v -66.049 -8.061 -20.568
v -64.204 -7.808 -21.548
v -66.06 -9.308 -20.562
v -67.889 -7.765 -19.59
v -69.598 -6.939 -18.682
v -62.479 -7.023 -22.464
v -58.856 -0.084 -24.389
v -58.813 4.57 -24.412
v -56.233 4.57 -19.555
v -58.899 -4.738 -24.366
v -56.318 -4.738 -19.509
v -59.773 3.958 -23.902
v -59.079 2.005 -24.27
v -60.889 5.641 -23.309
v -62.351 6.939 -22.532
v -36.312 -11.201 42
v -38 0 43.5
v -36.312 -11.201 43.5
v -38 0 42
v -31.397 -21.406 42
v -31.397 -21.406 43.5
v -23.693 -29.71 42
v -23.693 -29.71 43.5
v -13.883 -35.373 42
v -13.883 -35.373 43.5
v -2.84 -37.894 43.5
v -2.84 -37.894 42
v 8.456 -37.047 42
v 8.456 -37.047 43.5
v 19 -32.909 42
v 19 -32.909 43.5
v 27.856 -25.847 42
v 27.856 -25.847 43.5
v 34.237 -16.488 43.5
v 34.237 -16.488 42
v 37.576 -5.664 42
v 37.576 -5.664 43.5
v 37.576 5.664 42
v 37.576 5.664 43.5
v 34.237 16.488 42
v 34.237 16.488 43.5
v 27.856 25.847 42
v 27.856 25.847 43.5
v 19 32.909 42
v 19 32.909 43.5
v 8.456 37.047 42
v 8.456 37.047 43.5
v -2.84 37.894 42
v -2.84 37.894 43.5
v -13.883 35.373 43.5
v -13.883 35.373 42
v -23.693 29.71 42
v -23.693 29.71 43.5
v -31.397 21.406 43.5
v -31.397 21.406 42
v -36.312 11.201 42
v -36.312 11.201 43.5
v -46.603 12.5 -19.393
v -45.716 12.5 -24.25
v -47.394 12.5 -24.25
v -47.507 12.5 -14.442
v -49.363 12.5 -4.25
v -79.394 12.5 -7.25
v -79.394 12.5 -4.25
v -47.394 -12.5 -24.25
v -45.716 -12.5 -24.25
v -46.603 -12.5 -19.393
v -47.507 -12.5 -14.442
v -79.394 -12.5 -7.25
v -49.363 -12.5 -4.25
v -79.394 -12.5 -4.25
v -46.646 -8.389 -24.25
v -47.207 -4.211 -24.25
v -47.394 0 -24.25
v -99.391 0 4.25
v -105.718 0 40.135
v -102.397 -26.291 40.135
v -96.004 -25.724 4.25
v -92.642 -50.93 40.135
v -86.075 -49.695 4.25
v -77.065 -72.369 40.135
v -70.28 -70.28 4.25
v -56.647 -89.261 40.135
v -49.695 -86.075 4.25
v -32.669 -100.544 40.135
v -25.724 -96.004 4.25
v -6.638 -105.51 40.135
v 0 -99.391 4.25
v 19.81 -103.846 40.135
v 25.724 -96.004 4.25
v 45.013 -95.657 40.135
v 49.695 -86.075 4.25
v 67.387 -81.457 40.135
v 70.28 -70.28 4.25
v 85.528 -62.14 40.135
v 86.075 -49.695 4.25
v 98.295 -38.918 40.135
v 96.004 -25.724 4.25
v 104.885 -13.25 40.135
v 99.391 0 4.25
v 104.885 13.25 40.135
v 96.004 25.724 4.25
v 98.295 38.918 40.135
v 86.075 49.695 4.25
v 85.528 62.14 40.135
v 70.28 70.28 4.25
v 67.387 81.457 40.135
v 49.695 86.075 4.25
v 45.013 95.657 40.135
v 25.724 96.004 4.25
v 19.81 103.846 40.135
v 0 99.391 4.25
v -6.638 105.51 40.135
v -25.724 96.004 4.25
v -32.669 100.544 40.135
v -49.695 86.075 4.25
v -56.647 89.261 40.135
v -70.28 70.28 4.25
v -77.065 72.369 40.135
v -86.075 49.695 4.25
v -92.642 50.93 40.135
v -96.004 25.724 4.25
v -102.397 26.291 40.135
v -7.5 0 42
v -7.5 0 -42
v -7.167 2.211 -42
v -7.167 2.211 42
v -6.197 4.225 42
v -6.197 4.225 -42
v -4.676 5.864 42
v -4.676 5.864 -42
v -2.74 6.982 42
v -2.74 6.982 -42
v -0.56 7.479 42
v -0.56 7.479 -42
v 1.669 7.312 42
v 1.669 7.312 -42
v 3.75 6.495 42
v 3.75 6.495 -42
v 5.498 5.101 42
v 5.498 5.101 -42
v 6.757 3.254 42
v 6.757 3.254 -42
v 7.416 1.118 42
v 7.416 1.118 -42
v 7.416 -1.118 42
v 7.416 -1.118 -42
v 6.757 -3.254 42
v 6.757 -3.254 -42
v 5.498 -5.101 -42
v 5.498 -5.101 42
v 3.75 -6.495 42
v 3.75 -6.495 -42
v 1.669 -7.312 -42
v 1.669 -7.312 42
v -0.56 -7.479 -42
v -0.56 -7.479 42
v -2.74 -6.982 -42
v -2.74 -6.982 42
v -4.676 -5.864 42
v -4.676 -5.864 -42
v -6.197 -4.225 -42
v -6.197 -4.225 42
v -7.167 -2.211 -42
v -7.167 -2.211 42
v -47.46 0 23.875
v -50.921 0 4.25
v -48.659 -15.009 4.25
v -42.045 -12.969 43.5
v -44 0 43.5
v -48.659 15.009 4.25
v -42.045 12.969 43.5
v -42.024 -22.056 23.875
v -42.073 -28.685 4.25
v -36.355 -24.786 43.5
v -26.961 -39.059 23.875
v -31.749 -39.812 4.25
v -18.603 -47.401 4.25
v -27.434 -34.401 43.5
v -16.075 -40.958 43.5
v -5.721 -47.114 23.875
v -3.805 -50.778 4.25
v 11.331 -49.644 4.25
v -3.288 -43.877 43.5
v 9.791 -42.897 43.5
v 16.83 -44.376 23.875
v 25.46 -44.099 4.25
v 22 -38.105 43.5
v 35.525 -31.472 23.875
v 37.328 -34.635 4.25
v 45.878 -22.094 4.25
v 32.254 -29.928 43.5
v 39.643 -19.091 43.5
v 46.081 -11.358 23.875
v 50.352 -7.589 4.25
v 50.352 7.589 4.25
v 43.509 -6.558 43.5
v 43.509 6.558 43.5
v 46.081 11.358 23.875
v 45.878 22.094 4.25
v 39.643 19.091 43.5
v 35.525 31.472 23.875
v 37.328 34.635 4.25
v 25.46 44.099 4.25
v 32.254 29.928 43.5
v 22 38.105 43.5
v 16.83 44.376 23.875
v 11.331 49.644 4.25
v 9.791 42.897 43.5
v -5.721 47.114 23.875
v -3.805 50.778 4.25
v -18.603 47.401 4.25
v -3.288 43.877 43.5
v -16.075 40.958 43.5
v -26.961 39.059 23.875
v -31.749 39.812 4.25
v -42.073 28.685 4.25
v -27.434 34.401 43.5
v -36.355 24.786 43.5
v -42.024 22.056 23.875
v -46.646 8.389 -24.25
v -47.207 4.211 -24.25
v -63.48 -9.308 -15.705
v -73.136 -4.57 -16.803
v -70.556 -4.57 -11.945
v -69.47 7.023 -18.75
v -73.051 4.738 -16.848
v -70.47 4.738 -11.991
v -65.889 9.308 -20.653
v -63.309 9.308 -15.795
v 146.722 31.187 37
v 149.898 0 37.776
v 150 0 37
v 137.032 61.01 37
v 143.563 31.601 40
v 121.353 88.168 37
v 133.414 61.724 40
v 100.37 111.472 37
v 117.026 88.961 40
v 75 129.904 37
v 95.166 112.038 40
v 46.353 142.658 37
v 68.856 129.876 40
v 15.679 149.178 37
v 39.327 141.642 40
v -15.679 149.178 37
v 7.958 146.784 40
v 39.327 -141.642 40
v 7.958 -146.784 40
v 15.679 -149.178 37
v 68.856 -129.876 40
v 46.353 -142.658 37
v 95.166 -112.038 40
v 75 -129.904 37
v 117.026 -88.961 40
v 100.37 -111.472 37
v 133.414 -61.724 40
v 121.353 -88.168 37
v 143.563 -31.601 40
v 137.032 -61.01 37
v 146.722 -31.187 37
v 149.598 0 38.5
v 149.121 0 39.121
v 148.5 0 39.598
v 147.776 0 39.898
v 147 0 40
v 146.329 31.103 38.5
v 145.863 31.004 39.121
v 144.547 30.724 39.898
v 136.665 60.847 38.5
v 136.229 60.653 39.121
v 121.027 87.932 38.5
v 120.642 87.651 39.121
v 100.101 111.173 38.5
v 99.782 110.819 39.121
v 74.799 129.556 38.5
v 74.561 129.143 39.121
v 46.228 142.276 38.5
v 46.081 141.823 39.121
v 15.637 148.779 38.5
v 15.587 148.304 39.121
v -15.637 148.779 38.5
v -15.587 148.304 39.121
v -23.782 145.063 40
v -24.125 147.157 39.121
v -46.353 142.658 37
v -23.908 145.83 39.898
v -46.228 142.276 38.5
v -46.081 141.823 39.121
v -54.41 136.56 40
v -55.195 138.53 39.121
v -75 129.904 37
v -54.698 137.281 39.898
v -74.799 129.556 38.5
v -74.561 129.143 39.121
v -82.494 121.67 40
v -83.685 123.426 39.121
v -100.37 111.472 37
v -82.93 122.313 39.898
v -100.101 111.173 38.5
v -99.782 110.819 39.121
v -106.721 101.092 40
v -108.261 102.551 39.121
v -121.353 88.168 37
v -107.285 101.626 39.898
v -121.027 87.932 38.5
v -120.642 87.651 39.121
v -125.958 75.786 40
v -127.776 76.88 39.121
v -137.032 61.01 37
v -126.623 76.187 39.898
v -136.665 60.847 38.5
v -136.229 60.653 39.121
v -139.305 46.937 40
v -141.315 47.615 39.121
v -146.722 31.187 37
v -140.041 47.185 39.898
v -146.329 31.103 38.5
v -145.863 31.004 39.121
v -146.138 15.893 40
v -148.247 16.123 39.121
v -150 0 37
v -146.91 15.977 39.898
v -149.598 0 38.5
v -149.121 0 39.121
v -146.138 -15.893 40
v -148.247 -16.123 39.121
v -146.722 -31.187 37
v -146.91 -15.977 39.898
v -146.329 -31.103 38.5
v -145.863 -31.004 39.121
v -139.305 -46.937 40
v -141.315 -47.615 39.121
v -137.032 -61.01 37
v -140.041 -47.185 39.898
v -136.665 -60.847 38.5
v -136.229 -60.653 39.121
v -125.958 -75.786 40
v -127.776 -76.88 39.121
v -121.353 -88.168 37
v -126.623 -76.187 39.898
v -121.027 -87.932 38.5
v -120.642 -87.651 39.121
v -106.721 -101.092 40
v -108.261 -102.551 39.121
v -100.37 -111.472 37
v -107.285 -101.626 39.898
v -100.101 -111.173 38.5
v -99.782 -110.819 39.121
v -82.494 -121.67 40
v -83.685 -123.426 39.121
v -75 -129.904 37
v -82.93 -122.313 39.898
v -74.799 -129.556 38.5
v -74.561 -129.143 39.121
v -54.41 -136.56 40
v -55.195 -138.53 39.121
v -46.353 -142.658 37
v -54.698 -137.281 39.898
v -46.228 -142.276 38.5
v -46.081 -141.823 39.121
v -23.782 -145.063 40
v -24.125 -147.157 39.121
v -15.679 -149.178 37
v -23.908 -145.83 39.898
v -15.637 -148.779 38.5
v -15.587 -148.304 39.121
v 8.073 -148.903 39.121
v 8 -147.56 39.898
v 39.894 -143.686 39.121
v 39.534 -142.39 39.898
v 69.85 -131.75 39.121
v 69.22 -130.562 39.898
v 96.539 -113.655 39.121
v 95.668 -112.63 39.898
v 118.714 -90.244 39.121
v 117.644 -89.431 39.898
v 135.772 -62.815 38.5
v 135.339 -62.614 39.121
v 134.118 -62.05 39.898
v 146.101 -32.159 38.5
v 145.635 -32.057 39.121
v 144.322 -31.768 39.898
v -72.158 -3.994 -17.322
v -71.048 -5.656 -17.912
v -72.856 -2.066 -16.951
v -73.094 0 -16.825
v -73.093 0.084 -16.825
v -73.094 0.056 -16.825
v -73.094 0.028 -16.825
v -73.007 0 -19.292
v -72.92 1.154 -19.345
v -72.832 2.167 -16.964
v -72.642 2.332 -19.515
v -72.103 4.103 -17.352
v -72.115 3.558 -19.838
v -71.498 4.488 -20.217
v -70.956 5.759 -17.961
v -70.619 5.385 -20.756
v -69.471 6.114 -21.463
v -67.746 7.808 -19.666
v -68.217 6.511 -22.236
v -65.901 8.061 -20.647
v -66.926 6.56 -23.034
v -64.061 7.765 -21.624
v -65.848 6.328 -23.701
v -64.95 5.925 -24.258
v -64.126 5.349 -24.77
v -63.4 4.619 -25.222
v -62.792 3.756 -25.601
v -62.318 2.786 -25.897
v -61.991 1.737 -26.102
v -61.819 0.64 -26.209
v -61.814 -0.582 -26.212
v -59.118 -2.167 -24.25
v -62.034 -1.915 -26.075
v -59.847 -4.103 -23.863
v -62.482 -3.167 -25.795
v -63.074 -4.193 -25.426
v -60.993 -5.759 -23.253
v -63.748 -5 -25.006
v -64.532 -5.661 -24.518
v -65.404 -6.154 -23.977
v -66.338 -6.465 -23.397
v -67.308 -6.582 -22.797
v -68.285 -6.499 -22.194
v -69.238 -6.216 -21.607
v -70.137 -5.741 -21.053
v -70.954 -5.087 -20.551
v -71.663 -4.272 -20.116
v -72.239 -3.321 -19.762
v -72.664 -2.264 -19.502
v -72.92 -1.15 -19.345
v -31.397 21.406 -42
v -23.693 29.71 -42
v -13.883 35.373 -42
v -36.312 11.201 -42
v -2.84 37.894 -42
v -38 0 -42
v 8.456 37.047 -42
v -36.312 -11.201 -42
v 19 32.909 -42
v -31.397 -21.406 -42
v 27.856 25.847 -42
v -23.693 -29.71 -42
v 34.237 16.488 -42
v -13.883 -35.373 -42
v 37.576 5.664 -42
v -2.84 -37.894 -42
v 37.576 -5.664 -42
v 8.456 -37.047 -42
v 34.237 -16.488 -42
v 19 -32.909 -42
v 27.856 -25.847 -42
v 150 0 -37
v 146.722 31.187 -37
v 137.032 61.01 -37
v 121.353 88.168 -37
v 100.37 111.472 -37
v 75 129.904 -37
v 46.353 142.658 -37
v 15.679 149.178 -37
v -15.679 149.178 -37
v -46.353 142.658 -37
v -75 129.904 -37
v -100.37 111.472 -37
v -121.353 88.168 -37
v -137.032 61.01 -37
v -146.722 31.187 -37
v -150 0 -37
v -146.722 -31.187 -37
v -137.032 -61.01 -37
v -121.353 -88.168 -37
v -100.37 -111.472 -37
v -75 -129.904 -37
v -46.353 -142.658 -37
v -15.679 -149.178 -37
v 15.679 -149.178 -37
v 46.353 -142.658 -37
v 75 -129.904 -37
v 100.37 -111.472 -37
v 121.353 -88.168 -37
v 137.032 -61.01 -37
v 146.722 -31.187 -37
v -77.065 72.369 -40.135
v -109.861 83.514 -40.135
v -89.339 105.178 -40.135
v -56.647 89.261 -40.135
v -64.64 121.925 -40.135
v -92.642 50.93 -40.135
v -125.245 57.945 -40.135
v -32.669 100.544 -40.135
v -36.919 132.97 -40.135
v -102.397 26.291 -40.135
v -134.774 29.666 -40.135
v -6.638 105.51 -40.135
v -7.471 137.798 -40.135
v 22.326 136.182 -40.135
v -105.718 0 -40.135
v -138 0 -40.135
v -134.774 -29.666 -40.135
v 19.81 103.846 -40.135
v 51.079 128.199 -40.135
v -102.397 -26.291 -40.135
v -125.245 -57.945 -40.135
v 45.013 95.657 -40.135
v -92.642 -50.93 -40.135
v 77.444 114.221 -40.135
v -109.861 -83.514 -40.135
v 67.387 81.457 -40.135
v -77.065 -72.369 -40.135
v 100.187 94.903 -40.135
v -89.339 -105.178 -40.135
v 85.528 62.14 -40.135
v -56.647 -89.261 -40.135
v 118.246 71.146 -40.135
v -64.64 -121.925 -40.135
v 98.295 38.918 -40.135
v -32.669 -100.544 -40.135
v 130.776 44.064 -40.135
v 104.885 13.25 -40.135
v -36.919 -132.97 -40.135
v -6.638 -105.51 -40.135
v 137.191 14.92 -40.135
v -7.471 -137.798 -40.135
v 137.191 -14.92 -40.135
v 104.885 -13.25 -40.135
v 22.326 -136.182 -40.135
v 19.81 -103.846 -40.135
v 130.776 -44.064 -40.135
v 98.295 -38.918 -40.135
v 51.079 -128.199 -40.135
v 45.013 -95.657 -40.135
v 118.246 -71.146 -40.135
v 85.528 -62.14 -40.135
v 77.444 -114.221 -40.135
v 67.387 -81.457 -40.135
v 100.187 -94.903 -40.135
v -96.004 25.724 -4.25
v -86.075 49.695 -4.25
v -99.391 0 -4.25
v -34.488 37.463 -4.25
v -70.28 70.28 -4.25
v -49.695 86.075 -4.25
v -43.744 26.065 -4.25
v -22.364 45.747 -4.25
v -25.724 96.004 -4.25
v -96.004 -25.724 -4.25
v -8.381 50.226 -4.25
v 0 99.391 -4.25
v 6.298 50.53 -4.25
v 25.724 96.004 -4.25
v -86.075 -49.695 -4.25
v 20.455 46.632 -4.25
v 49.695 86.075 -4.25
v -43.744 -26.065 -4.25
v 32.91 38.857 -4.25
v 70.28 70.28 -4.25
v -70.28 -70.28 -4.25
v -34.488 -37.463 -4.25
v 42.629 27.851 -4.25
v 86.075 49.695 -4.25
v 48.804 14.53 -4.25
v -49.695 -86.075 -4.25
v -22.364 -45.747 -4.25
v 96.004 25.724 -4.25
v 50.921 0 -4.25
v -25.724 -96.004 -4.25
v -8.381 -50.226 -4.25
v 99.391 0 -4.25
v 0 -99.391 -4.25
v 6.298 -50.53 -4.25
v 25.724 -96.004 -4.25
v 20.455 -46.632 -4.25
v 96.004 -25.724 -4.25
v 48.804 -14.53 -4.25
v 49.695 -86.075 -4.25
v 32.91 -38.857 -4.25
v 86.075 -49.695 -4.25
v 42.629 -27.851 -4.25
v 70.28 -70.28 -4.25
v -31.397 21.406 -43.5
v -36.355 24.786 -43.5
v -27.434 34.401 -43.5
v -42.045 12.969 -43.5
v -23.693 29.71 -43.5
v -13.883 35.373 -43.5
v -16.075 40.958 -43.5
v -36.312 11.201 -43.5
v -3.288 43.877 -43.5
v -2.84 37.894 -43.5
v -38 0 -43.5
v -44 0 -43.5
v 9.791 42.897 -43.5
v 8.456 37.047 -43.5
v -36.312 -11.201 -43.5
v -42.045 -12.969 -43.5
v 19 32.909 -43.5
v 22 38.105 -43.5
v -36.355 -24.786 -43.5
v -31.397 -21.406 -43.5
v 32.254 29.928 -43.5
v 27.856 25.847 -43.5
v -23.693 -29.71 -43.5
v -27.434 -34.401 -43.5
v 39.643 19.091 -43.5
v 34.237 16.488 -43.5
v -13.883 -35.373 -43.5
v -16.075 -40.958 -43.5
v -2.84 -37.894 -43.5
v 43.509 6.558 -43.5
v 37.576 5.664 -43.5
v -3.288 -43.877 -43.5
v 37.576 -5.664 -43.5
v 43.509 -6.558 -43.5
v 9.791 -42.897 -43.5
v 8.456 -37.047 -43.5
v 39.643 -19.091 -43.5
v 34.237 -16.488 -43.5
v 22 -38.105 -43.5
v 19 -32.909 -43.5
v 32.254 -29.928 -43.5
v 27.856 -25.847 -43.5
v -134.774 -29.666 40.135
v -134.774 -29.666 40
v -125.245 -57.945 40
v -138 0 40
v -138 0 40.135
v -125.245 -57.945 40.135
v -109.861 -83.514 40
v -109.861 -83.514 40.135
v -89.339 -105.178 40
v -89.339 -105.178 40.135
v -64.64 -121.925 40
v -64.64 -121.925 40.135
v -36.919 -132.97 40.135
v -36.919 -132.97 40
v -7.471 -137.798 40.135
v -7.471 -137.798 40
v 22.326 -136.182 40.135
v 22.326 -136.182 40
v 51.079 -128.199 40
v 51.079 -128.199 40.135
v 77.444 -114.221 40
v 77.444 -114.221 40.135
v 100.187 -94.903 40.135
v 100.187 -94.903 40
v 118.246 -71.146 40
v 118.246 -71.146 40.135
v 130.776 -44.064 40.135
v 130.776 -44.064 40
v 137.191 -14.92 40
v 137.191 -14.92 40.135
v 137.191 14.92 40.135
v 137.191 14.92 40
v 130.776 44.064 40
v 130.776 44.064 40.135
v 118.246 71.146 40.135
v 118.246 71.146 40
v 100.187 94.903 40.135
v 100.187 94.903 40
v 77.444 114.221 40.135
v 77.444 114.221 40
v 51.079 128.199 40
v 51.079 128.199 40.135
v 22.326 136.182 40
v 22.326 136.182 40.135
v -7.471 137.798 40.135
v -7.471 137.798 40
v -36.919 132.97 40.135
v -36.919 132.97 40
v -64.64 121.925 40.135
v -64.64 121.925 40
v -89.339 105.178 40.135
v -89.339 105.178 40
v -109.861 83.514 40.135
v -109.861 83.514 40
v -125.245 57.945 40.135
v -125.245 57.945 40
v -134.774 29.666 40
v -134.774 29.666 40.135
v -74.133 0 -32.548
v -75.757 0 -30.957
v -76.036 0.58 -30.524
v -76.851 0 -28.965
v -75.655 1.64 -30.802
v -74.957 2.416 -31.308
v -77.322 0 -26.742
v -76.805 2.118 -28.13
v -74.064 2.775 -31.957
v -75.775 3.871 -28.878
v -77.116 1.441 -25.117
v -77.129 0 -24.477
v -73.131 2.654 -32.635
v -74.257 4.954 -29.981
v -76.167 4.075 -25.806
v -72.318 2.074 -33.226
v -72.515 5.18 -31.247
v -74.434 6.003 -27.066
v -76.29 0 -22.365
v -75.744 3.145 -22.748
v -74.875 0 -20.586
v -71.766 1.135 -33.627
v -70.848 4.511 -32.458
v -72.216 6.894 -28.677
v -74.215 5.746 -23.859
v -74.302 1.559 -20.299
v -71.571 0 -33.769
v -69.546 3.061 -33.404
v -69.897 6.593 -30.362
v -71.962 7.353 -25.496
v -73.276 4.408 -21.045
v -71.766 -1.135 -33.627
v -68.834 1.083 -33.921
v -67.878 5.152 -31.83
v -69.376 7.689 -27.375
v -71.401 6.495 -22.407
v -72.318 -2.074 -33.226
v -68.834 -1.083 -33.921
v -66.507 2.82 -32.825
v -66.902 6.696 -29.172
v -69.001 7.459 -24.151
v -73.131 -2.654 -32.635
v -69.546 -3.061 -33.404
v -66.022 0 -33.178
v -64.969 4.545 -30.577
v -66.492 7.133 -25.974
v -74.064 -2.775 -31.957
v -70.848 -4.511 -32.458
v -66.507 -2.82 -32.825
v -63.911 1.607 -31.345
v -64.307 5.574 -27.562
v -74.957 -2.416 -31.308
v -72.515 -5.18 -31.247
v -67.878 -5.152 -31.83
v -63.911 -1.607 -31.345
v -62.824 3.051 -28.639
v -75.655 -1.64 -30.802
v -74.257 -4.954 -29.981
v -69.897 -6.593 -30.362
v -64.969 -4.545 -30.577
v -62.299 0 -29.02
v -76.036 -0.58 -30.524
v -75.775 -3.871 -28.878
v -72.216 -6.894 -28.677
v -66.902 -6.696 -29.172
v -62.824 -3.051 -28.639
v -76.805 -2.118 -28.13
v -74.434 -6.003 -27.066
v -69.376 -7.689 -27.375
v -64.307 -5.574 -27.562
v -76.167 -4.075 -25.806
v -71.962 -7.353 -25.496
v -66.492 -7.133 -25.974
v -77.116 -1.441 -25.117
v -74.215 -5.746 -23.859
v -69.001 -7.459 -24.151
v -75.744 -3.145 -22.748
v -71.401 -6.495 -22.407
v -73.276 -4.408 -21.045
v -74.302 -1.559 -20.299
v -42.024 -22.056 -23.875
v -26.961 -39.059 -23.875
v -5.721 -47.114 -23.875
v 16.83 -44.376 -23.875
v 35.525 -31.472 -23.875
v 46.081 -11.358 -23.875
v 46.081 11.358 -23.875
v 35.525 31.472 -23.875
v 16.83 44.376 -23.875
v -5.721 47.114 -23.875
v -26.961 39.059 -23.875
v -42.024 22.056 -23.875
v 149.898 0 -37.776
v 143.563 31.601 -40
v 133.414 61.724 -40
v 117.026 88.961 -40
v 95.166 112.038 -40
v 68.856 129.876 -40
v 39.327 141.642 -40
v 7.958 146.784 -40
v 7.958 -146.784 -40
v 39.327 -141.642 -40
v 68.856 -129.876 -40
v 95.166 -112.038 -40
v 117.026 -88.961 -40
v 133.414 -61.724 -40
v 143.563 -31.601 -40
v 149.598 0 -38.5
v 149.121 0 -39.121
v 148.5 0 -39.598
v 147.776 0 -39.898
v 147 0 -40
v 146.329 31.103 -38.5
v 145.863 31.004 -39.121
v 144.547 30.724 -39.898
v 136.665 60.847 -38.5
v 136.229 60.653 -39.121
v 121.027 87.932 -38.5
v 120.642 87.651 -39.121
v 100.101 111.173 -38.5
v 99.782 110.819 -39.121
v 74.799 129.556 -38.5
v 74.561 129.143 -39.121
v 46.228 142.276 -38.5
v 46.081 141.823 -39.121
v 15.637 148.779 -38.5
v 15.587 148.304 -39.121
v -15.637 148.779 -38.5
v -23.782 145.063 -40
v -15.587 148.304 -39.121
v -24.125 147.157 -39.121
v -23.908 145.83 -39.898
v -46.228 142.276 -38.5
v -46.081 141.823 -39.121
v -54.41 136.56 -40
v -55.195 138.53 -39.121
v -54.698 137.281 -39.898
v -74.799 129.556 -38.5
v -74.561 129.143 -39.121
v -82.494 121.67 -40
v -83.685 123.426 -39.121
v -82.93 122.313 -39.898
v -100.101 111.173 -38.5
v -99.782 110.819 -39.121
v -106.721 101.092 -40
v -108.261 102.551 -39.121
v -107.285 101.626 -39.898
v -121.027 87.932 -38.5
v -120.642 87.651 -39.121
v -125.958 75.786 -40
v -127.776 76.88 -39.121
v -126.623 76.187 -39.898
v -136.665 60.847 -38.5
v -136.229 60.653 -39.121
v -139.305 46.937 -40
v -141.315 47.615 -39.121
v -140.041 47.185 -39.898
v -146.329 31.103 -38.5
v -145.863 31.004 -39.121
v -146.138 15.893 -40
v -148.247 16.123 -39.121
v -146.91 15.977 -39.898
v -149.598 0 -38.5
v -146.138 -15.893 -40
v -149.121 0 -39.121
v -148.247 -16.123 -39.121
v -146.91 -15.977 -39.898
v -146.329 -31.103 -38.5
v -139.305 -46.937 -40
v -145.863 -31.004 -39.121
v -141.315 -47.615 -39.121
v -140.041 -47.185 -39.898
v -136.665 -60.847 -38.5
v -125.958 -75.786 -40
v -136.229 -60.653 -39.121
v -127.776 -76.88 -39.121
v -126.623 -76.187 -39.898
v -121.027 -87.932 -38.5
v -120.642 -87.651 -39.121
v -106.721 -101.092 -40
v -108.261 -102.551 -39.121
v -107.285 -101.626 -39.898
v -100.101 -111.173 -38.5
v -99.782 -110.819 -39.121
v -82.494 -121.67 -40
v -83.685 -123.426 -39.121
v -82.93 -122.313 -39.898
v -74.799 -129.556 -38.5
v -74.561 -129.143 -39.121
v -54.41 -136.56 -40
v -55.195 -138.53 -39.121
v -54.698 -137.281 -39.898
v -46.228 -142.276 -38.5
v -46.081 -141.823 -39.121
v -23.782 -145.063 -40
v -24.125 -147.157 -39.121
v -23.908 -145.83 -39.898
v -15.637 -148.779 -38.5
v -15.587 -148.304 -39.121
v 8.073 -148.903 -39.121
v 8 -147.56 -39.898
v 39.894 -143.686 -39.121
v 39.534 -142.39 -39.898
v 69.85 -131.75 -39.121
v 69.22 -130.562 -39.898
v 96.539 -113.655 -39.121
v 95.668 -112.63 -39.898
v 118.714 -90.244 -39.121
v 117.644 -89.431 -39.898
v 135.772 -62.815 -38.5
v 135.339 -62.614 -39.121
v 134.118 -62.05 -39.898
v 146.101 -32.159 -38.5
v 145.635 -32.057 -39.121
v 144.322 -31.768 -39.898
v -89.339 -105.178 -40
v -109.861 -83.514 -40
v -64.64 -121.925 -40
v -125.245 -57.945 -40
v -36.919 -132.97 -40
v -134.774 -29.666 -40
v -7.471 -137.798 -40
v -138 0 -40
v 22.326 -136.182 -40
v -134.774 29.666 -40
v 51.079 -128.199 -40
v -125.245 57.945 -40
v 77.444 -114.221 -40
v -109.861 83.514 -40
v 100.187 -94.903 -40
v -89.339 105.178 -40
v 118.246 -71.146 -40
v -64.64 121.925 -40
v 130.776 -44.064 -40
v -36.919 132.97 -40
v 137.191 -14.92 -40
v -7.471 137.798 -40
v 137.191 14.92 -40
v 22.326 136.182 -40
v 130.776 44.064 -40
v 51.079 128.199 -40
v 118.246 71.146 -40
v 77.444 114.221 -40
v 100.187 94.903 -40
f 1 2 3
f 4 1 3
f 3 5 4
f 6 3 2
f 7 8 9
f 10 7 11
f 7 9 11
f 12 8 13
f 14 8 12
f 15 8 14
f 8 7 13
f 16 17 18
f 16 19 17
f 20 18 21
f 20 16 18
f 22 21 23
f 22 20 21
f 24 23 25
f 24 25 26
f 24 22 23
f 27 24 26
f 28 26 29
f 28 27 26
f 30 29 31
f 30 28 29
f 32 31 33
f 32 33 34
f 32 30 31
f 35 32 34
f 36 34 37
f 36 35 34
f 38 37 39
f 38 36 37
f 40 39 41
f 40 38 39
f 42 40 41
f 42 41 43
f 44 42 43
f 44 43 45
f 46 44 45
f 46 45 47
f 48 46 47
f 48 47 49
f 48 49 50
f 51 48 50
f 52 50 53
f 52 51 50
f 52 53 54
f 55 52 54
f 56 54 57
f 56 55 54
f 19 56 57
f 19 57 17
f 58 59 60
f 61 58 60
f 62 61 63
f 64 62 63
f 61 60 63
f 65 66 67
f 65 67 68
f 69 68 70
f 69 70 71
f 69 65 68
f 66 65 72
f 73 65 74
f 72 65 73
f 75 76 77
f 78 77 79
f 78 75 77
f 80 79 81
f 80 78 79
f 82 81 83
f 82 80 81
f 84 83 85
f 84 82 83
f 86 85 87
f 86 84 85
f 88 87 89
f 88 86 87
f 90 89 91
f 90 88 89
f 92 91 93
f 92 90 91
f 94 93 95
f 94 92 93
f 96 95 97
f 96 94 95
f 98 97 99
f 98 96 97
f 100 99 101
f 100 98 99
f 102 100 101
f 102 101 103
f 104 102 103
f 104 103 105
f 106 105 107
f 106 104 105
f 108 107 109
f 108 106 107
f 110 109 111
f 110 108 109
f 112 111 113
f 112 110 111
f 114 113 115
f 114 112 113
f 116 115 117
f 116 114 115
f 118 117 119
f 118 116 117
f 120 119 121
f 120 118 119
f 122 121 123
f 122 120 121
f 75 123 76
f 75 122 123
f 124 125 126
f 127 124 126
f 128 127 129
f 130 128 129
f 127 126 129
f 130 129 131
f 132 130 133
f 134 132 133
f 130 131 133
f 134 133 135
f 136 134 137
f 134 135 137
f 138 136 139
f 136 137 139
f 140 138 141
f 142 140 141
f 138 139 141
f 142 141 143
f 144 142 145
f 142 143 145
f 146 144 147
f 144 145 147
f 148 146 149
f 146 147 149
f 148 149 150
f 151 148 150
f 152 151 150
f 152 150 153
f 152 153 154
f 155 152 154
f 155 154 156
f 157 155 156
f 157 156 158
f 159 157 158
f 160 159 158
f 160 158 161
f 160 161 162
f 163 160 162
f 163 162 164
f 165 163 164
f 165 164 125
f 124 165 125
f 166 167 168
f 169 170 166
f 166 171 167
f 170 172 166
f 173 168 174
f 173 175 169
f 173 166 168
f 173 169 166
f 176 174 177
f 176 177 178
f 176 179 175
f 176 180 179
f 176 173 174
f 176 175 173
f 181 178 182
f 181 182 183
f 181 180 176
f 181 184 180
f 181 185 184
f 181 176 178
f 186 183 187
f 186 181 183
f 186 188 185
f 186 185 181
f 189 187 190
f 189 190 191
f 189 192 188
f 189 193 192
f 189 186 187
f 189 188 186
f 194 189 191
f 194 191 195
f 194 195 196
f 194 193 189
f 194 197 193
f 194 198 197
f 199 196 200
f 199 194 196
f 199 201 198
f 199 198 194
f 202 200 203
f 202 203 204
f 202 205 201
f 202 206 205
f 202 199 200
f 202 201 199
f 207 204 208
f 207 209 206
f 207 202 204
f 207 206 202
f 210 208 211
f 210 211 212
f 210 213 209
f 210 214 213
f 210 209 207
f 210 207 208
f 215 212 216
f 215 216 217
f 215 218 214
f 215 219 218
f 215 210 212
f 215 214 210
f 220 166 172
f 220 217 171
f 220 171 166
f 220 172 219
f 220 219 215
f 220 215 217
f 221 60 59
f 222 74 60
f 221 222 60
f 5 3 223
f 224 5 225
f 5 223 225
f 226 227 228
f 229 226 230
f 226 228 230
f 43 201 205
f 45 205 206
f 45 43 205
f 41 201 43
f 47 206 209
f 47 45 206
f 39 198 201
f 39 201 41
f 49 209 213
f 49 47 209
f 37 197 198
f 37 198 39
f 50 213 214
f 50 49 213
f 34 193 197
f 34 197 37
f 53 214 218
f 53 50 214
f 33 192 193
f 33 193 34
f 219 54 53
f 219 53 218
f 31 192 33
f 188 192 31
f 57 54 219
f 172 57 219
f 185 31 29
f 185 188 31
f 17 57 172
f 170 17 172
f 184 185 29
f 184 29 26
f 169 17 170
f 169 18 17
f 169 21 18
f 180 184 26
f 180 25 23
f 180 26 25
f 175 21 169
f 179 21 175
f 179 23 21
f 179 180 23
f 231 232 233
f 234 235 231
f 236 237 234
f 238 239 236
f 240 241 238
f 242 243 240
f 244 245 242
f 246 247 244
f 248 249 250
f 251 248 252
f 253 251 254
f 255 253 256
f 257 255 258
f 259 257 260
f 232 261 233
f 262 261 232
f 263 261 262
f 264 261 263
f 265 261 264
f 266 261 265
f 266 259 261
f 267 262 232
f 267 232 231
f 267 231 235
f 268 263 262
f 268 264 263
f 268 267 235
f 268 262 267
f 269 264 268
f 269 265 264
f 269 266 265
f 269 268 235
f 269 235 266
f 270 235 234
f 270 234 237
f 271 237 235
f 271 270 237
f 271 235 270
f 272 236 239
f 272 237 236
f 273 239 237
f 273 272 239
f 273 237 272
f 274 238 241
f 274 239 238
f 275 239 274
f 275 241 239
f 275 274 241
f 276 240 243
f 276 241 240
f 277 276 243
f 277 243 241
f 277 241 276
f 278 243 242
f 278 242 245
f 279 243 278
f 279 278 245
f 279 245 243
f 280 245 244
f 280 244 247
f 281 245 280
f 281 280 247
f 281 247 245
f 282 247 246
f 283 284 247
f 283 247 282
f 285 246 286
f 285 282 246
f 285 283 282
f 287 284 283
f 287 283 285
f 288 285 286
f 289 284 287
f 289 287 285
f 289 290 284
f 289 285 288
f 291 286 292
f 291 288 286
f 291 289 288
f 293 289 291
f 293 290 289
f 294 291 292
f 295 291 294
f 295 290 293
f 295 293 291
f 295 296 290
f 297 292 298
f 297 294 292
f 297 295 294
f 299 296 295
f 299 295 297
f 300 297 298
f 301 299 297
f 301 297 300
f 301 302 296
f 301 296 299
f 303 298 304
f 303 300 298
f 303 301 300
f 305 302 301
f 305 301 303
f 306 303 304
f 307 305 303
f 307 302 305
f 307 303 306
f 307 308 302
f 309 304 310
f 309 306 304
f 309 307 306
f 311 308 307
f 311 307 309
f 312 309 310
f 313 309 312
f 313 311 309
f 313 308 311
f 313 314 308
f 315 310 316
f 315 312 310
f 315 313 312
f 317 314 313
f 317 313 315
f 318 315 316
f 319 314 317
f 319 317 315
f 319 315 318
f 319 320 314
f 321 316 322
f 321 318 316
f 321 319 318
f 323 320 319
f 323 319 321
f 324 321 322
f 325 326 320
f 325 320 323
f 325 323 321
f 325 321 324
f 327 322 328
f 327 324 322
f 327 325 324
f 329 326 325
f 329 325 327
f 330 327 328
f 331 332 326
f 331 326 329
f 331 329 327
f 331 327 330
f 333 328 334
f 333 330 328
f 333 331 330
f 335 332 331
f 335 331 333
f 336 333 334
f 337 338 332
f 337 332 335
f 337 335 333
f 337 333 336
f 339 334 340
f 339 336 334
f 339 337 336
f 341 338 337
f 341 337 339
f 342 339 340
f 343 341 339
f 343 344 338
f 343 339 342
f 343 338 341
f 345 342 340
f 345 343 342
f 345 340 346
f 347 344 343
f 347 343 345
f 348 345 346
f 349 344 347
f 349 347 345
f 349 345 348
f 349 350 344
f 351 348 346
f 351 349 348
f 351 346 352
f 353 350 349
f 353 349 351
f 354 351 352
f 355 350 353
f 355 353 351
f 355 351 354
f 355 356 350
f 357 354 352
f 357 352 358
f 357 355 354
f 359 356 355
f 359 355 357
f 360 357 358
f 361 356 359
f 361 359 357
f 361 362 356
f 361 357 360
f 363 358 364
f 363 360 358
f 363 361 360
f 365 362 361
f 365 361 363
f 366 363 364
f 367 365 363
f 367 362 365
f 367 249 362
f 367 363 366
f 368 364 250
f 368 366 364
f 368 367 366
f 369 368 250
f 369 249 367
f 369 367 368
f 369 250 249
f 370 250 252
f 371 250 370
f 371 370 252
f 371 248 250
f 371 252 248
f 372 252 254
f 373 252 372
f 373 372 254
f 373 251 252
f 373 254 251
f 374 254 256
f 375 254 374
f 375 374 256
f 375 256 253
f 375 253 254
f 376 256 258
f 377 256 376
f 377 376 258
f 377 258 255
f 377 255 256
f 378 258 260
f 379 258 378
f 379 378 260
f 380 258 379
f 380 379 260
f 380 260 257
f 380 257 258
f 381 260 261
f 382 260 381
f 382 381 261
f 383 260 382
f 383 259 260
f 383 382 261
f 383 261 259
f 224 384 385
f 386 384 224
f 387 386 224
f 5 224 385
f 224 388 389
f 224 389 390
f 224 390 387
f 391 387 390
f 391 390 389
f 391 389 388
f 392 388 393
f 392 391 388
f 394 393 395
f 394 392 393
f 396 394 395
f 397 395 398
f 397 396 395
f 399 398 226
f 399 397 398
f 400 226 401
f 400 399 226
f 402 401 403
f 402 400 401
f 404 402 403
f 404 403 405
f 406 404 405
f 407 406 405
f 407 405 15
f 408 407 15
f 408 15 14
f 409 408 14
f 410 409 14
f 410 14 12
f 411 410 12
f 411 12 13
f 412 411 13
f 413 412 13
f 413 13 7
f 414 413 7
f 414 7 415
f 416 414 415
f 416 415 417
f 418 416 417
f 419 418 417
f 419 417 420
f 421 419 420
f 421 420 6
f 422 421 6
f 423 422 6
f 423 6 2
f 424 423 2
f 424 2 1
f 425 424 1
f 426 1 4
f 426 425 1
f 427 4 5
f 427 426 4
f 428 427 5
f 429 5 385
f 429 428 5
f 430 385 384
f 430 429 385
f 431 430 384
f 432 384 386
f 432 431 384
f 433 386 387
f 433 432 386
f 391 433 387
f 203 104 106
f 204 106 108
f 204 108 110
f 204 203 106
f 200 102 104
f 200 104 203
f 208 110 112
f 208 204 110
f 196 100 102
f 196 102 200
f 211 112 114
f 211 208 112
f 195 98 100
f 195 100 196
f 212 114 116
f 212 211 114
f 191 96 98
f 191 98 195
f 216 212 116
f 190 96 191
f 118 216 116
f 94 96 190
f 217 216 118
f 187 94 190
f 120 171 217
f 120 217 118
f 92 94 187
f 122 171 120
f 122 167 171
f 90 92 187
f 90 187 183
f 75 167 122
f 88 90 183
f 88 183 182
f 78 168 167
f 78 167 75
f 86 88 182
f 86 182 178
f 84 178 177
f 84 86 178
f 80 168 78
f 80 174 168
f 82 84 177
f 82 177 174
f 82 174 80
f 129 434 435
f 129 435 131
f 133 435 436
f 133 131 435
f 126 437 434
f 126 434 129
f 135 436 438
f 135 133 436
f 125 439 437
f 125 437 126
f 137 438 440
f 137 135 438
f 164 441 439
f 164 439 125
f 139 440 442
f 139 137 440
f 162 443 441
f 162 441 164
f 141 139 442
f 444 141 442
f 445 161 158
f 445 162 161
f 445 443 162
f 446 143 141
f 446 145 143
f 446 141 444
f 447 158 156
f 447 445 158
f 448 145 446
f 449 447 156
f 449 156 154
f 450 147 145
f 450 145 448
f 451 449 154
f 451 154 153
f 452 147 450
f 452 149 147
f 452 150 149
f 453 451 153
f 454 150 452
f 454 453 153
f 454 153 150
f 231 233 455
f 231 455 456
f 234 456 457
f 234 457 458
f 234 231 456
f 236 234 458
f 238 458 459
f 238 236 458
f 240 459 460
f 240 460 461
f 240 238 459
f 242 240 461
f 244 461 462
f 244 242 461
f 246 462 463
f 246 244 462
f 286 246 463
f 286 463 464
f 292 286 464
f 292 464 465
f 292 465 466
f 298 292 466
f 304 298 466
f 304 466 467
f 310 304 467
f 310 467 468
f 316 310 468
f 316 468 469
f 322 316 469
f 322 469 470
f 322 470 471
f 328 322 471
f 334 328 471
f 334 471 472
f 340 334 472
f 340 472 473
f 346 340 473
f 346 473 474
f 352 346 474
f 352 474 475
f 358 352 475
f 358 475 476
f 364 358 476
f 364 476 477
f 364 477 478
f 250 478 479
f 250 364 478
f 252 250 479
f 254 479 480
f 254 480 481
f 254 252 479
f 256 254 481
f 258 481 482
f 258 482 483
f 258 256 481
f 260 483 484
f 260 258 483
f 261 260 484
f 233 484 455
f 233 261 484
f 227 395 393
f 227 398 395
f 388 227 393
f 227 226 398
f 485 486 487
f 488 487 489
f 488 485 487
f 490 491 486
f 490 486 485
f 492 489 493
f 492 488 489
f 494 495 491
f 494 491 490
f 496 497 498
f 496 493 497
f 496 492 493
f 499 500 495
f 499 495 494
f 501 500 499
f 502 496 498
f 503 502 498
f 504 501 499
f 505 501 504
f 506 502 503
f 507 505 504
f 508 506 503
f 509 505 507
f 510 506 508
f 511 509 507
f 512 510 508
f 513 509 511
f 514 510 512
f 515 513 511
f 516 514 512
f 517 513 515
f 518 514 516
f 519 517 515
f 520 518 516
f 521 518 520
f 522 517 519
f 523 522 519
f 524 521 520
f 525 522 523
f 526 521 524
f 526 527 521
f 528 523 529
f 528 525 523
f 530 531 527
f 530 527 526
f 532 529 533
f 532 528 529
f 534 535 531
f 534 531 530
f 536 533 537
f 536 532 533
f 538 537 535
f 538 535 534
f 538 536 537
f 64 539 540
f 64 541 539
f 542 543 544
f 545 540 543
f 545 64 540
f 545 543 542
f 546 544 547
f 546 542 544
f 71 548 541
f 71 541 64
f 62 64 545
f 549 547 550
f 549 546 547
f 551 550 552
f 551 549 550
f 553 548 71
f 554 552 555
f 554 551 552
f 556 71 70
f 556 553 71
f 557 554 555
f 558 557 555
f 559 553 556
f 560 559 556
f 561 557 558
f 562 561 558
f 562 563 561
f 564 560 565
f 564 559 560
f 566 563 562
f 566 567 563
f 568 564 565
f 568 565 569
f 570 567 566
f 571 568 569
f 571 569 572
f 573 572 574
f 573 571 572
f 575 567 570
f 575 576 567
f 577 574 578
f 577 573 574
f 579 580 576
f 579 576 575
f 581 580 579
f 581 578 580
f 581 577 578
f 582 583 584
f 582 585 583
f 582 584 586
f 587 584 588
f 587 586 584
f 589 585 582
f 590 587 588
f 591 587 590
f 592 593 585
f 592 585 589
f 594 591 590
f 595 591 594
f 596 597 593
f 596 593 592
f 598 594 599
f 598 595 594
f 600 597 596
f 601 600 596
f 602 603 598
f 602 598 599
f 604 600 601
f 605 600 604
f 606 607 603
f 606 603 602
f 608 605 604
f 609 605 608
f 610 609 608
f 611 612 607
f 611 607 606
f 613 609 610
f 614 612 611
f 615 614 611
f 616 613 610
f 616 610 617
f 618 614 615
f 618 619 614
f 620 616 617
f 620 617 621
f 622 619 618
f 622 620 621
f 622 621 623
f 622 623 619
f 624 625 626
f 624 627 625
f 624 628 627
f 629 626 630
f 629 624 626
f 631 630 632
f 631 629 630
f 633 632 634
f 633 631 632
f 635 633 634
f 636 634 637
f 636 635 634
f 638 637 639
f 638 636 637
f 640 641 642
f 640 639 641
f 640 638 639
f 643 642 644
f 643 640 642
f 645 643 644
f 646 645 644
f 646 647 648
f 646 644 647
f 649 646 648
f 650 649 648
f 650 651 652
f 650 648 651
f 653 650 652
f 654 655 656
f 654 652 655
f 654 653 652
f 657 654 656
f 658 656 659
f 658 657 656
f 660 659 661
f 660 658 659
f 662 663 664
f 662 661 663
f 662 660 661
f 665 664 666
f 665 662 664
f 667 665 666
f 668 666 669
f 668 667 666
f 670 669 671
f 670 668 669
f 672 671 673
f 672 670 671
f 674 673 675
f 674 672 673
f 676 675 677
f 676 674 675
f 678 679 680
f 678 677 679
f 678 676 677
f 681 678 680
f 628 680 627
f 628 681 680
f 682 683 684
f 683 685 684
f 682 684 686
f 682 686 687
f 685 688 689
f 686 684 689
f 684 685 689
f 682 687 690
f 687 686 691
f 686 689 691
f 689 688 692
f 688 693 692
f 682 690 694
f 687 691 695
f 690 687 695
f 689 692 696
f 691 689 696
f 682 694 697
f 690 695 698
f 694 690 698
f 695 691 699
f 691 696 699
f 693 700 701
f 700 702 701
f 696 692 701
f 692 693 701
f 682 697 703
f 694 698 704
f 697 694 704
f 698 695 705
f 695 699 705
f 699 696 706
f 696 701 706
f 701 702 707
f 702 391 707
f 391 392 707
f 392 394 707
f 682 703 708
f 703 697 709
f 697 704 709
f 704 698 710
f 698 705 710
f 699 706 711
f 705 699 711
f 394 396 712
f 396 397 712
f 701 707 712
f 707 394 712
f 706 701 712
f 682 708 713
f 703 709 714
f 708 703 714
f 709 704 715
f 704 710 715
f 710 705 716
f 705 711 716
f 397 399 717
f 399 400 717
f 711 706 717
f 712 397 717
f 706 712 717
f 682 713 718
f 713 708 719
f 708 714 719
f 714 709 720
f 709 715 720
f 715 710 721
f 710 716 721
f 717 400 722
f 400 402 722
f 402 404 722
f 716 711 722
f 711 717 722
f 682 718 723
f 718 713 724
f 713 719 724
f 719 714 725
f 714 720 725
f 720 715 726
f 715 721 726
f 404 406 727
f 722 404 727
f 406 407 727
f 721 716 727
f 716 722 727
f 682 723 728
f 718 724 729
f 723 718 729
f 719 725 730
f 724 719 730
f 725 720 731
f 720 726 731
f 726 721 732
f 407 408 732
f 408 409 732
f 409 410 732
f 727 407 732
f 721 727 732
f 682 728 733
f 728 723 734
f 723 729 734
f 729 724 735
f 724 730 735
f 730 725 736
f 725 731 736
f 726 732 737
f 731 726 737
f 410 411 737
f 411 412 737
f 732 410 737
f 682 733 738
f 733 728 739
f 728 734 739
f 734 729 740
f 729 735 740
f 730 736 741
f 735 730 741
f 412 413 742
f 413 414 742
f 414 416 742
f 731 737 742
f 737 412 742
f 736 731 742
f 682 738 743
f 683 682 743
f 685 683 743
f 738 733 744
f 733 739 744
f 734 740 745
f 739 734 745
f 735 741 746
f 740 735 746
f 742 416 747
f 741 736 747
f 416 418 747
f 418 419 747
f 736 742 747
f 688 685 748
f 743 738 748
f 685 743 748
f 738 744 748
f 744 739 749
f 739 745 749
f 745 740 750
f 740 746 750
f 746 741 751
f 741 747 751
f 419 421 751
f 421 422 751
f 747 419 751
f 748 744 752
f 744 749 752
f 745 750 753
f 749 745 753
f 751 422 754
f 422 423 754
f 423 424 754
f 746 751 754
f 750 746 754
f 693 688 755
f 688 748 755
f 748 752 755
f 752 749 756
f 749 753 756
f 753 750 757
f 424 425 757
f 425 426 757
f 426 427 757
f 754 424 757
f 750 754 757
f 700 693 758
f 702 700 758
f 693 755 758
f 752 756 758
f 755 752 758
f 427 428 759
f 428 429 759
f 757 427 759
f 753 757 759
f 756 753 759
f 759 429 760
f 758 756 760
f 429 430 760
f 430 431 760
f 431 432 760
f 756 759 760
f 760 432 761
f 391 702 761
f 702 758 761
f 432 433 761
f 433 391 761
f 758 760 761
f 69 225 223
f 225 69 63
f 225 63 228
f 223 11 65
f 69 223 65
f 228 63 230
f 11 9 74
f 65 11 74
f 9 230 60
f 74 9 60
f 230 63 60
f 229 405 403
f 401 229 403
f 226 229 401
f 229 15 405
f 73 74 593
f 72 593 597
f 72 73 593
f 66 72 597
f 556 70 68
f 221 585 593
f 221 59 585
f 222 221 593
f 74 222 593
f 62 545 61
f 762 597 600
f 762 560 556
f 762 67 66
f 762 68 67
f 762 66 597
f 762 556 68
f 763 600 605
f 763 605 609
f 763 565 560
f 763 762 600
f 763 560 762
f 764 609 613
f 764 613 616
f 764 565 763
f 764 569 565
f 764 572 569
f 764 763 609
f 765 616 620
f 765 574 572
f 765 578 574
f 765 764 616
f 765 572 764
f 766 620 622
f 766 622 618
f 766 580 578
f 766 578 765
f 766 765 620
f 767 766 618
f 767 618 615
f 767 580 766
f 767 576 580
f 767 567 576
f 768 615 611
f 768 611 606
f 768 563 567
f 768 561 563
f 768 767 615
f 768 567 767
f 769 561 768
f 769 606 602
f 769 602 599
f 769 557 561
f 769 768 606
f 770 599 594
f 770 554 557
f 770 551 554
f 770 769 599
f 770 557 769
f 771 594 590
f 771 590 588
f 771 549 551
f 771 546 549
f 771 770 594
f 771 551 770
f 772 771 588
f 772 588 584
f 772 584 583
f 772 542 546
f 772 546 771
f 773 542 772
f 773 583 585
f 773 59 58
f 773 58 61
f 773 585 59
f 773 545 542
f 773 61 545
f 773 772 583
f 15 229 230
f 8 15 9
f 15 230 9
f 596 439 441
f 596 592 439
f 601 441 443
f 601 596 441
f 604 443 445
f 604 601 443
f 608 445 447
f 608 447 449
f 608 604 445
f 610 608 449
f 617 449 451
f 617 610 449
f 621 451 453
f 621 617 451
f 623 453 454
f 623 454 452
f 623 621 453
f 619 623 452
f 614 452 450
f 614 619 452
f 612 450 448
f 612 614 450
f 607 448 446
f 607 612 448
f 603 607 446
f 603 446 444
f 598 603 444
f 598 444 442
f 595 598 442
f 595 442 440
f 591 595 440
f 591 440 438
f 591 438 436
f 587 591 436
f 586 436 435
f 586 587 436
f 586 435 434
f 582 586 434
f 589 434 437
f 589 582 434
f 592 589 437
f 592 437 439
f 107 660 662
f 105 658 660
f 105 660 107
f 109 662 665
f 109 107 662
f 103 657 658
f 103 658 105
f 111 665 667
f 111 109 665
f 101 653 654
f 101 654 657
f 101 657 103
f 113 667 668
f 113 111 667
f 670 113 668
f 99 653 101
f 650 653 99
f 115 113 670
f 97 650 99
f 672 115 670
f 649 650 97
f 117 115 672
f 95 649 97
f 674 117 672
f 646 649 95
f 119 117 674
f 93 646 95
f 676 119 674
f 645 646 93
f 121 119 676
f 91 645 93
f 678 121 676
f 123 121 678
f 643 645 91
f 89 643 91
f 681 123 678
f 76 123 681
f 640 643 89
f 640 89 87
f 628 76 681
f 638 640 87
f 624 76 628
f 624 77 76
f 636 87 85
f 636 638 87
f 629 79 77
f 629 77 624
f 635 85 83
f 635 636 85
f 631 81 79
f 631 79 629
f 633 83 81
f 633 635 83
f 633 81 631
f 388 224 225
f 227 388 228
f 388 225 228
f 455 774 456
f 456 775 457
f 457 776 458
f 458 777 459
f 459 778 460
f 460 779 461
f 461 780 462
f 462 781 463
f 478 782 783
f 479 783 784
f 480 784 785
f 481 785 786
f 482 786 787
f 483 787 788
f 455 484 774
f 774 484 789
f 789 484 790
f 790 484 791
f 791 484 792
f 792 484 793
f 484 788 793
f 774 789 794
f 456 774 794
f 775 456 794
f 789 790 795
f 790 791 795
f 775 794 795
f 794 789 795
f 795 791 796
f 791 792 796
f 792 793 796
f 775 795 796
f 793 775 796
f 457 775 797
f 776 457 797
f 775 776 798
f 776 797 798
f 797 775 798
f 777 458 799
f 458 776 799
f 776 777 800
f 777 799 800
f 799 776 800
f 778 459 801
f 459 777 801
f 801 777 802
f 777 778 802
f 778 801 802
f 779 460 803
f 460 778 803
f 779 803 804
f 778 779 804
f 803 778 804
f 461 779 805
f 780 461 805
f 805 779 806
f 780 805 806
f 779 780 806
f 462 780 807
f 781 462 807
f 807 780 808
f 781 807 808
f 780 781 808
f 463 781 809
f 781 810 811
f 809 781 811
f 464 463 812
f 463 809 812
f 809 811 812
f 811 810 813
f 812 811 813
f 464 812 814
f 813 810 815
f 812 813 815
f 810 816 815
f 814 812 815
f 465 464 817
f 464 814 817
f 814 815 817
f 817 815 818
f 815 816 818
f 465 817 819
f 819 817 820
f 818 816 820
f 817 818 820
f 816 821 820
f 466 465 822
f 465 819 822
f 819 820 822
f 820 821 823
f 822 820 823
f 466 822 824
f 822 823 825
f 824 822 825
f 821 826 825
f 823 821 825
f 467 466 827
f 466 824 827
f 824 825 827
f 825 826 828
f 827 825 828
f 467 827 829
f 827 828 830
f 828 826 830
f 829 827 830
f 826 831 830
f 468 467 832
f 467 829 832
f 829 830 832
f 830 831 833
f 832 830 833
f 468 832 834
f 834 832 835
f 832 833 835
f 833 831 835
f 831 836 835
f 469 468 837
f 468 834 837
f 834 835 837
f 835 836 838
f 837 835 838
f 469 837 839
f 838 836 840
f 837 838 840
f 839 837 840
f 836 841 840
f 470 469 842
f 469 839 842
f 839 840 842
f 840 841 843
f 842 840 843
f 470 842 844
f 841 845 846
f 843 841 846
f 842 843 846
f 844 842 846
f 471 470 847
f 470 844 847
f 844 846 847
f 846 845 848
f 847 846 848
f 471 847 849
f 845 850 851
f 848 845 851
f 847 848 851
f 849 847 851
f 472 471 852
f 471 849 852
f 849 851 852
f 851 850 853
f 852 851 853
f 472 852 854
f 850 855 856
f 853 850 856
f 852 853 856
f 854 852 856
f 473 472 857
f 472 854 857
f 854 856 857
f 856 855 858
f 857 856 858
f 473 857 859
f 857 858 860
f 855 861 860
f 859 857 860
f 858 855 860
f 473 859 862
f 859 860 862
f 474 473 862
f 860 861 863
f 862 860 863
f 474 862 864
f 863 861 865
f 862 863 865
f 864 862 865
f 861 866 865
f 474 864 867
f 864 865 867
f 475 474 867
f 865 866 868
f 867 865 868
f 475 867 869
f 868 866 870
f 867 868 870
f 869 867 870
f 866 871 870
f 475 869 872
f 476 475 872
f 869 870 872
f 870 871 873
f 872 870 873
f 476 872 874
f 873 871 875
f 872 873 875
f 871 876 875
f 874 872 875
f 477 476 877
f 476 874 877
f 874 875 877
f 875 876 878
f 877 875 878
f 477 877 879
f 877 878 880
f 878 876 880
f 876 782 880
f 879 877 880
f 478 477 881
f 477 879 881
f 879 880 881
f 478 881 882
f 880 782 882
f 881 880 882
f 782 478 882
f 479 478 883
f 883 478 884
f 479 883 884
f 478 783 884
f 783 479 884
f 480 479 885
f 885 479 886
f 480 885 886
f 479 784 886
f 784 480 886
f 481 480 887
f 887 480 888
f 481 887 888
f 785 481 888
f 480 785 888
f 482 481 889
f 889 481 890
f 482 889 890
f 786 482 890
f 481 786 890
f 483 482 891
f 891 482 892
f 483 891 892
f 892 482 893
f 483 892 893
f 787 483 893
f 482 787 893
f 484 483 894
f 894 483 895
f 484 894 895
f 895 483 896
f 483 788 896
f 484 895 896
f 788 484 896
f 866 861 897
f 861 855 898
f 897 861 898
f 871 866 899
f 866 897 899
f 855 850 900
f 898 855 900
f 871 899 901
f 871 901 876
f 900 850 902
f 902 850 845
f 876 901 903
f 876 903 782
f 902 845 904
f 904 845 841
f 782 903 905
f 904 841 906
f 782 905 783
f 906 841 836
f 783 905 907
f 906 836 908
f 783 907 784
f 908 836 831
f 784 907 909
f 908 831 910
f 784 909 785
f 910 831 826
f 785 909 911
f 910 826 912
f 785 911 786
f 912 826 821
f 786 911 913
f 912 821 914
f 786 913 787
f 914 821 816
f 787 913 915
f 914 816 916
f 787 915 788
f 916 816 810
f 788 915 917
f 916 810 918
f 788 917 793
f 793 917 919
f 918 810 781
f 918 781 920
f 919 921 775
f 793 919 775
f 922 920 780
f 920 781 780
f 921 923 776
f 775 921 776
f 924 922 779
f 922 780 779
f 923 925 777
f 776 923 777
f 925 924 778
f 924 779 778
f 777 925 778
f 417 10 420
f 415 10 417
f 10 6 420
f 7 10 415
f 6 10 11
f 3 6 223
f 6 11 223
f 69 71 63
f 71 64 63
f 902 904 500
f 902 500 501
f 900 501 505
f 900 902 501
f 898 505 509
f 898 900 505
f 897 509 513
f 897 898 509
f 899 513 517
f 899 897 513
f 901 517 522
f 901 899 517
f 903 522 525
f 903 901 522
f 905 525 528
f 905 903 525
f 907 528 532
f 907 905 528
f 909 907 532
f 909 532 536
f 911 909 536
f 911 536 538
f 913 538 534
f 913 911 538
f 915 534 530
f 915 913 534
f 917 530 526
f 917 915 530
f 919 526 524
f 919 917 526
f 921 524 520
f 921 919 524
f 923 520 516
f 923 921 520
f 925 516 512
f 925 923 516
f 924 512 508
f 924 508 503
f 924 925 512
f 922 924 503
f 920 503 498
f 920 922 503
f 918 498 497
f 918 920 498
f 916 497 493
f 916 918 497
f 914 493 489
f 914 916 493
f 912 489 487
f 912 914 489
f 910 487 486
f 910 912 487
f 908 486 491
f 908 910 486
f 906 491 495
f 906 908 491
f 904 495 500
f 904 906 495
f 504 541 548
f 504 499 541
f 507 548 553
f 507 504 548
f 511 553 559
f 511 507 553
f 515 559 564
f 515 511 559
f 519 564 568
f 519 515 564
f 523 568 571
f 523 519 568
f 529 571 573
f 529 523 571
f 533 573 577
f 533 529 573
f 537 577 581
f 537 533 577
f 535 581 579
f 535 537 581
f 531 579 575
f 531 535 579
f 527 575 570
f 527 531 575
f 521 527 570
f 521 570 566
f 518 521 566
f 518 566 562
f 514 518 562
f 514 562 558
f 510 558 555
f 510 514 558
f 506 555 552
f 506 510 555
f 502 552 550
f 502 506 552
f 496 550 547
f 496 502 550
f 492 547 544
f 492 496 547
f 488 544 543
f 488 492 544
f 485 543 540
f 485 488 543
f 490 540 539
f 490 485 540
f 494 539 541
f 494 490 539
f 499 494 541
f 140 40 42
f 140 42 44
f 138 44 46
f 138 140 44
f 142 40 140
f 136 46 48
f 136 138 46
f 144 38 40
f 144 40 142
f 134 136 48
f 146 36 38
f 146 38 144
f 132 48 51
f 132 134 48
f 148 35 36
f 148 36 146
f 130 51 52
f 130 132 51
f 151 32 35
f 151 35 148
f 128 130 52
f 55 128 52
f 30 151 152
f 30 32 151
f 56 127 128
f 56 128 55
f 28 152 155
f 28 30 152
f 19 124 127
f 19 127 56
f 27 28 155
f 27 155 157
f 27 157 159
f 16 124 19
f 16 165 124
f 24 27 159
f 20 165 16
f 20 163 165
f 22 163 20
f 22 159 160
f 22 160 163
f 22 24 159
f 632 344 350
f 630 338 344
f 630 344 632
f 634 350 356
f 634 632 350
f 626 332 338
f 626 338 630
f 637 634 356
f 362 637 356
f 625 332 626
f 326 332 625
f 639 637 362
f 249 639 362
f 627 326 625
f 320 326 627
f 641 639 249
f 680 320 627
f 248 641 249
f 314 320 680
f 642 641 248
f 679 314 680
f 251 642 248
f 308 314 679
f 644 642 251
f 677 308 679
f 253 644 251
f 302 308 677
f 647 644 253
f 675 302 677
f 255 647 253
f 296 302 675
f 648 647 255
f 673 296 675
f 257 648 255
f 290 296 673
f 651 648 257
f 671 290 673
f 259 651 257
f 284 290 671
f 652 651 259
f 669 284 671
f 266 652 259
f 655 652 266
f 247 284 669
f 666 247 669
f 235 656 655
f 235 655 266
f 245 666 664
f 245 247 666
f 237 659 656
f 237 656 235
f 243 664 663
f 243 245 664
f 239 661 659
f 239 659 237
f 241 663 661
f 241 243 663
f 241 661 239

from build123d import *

# Parameters (mm, degrees)
SKETCH1_R           = 150
SKETCH1_R_2         = 138
BOSS_EXTRUDE1_DEPTH = 40
FILLET4_R           = 3
BOSS_EXTRUDE2_DEPTH = 12.5
BOSS_EXTRUDE3_DEPTH = 5.5
SKETCH6_R           = 8.061337792
BOSS_EXTRUDE4_DEPTH = 3
BOSS_EXTRUDE4_TAPER = 30
SKETCH8_R           = 7.5
CUT_EXTRUDE1_DEPTH  = 229.714341483


with BuildPart() as part:
    # Sketch1 → Boss-Extrude1 (new, symmetric)
    with BuildSketch(Plane.XY):
        Circle(SKETCH1_R)
        Circle(SKETCH1_R_2, mode=Mode.SUBTRACT)
    extrude(amount=BOSS_EXTRUDE1_DEPTH, both=True)

    # Fillet4
    fillet4_edges = [part.edges().sort_by_distance(p)[0] for p in [
        (-150, 0, -40),
        (-150, 0, 40),
    ]]
    fillet(fillet4_edges, radius=FILLET4_R)



with BuildPart() as body_2:
    # Sketch3 → Revolve6 (revolve)
    with BuildSketch(Plane(origin=(0, 0, 0), x_dir=(1, 0, 0), z_dir=(0, 1, 0))):
        Polygon((0, -42), (0, 42), (-38, 42), (-38, 43.5), (-44, 43.5), (-50.920833993, 4.25), (-99.390952242, 4.25), (-105.718469789, 40.135135225), (-138, 40.135135225), (-138, 0.135135225), (-138, 0), (-138, -0.135135225), (-138, -40.135135225), (-105.718469789, -40.135135225), (-99.390952242, -4.25), (-50.920833993, -4.25), (-44, -43.5), (-38, -43.5), (-38, -42), align=None)
    revolve(axis=Axis((0, 0, -71.241325943), (0, 0, 1)))


with BuildPart() as part_1:
    add(part.part)

    add(body_2.part)  # Boss-Extrude2 merges body 2
    # Sketch4 → Boss-Extrude2 (add, symmetric)
    with BuildSketch(Plane(origin=(0, 0, 0), x_dir=(1, 0, 0), z_dir=(0, 1, 0))):
        Polygon((-44.394294379, 24.25), (-44.394294379, 4.25), (-79.394294379, 4.25), (-79.394294379, 7.25), (-47.394294379, 24.25), align=None)
    extrude(amount=BOSS_EXTRUDE2_DEPTH, both=True)

    # Sketch5 → Boss-Extrude3 (add)
    with BuildSketch(Plane(origin=(-20.479018336, 0, -38.548740398), x_dir=(-0.8831157194574107, 0, 0.46915522596174897), z_dir=(-0.46915522596174897, 0, -0.8831157194574107))):
        Polygon((56.704671627, -4.570014345), (56.607735872, 4.737911997), (48.498367326, 9.307926342), (40.485934534, 4.570014345), (40.582870289, -4.737911997), (48.692238836, -9.307926342), align=None)
    extrude(amount=BOSS_EXTRUDE3_DEPTH)

    # Sketch6 → Boss-Extrude4 (add)
    with BuildSketch(Plane(origin=(-23.059372079, 0, -43.405876855), x_dir=(-0.8831157194574104, 0, 0.46915522596174986), z_dir=(-0.4691552259617498, 0, -0.8831157194574103))):
        with Locations((48.595303081, 0)):
            Circle(SKETCH6_R)
    extrude(amount=BOSS_EXTRUDE4_DEPTH, taper=BOSS_EXTRUDE4_TAPER)

    # Sketch7 → Revolve7 (revolve)
    with BuildSketch(Plane(origin=(0, 0, 0), x_dir=(1, 0, 0), z_dir=(0, 1, 0)), mode=Mode.PRIVATE) as revolve7_sk:
        with BuildLine():
            ThreePointArc((-74.132927223, 32.5476045), (-66.020984278, 33.177231974), (-61.79262097, 26.225901681))
            Line((-61.79262097, 26.225901681), (-67.382113799, 23.256483615))
            Line((-67.382113799, 23.256483615), (-74.132927223, 32.5476045))
        make_face()
    revolve(revolve7_sk.sketch.rotate(Axis((-67.382113799, 0, -23.256483615), (-0.5878091288499389, 0, -0.8089996465021947)), 180), axis=Axis((-67.382113799, 0, -23.256483615), (-0.5878091288499389, 0, -0.8089996465021947)))

    # Sketch8 → Cut-Extrude1 (cut, through all)
    with BuildSketch(Plane(origin=(0, 0, -42), x_dir=(-1, 0, 0), z_dir=(0, 0, -1))):
        Circle(SKETCH8_R)
    extrude(amount=-CUT_EXTRUDE1_DEPTH, mode=Mode.SUBTRACT)


solid = part_1.part
